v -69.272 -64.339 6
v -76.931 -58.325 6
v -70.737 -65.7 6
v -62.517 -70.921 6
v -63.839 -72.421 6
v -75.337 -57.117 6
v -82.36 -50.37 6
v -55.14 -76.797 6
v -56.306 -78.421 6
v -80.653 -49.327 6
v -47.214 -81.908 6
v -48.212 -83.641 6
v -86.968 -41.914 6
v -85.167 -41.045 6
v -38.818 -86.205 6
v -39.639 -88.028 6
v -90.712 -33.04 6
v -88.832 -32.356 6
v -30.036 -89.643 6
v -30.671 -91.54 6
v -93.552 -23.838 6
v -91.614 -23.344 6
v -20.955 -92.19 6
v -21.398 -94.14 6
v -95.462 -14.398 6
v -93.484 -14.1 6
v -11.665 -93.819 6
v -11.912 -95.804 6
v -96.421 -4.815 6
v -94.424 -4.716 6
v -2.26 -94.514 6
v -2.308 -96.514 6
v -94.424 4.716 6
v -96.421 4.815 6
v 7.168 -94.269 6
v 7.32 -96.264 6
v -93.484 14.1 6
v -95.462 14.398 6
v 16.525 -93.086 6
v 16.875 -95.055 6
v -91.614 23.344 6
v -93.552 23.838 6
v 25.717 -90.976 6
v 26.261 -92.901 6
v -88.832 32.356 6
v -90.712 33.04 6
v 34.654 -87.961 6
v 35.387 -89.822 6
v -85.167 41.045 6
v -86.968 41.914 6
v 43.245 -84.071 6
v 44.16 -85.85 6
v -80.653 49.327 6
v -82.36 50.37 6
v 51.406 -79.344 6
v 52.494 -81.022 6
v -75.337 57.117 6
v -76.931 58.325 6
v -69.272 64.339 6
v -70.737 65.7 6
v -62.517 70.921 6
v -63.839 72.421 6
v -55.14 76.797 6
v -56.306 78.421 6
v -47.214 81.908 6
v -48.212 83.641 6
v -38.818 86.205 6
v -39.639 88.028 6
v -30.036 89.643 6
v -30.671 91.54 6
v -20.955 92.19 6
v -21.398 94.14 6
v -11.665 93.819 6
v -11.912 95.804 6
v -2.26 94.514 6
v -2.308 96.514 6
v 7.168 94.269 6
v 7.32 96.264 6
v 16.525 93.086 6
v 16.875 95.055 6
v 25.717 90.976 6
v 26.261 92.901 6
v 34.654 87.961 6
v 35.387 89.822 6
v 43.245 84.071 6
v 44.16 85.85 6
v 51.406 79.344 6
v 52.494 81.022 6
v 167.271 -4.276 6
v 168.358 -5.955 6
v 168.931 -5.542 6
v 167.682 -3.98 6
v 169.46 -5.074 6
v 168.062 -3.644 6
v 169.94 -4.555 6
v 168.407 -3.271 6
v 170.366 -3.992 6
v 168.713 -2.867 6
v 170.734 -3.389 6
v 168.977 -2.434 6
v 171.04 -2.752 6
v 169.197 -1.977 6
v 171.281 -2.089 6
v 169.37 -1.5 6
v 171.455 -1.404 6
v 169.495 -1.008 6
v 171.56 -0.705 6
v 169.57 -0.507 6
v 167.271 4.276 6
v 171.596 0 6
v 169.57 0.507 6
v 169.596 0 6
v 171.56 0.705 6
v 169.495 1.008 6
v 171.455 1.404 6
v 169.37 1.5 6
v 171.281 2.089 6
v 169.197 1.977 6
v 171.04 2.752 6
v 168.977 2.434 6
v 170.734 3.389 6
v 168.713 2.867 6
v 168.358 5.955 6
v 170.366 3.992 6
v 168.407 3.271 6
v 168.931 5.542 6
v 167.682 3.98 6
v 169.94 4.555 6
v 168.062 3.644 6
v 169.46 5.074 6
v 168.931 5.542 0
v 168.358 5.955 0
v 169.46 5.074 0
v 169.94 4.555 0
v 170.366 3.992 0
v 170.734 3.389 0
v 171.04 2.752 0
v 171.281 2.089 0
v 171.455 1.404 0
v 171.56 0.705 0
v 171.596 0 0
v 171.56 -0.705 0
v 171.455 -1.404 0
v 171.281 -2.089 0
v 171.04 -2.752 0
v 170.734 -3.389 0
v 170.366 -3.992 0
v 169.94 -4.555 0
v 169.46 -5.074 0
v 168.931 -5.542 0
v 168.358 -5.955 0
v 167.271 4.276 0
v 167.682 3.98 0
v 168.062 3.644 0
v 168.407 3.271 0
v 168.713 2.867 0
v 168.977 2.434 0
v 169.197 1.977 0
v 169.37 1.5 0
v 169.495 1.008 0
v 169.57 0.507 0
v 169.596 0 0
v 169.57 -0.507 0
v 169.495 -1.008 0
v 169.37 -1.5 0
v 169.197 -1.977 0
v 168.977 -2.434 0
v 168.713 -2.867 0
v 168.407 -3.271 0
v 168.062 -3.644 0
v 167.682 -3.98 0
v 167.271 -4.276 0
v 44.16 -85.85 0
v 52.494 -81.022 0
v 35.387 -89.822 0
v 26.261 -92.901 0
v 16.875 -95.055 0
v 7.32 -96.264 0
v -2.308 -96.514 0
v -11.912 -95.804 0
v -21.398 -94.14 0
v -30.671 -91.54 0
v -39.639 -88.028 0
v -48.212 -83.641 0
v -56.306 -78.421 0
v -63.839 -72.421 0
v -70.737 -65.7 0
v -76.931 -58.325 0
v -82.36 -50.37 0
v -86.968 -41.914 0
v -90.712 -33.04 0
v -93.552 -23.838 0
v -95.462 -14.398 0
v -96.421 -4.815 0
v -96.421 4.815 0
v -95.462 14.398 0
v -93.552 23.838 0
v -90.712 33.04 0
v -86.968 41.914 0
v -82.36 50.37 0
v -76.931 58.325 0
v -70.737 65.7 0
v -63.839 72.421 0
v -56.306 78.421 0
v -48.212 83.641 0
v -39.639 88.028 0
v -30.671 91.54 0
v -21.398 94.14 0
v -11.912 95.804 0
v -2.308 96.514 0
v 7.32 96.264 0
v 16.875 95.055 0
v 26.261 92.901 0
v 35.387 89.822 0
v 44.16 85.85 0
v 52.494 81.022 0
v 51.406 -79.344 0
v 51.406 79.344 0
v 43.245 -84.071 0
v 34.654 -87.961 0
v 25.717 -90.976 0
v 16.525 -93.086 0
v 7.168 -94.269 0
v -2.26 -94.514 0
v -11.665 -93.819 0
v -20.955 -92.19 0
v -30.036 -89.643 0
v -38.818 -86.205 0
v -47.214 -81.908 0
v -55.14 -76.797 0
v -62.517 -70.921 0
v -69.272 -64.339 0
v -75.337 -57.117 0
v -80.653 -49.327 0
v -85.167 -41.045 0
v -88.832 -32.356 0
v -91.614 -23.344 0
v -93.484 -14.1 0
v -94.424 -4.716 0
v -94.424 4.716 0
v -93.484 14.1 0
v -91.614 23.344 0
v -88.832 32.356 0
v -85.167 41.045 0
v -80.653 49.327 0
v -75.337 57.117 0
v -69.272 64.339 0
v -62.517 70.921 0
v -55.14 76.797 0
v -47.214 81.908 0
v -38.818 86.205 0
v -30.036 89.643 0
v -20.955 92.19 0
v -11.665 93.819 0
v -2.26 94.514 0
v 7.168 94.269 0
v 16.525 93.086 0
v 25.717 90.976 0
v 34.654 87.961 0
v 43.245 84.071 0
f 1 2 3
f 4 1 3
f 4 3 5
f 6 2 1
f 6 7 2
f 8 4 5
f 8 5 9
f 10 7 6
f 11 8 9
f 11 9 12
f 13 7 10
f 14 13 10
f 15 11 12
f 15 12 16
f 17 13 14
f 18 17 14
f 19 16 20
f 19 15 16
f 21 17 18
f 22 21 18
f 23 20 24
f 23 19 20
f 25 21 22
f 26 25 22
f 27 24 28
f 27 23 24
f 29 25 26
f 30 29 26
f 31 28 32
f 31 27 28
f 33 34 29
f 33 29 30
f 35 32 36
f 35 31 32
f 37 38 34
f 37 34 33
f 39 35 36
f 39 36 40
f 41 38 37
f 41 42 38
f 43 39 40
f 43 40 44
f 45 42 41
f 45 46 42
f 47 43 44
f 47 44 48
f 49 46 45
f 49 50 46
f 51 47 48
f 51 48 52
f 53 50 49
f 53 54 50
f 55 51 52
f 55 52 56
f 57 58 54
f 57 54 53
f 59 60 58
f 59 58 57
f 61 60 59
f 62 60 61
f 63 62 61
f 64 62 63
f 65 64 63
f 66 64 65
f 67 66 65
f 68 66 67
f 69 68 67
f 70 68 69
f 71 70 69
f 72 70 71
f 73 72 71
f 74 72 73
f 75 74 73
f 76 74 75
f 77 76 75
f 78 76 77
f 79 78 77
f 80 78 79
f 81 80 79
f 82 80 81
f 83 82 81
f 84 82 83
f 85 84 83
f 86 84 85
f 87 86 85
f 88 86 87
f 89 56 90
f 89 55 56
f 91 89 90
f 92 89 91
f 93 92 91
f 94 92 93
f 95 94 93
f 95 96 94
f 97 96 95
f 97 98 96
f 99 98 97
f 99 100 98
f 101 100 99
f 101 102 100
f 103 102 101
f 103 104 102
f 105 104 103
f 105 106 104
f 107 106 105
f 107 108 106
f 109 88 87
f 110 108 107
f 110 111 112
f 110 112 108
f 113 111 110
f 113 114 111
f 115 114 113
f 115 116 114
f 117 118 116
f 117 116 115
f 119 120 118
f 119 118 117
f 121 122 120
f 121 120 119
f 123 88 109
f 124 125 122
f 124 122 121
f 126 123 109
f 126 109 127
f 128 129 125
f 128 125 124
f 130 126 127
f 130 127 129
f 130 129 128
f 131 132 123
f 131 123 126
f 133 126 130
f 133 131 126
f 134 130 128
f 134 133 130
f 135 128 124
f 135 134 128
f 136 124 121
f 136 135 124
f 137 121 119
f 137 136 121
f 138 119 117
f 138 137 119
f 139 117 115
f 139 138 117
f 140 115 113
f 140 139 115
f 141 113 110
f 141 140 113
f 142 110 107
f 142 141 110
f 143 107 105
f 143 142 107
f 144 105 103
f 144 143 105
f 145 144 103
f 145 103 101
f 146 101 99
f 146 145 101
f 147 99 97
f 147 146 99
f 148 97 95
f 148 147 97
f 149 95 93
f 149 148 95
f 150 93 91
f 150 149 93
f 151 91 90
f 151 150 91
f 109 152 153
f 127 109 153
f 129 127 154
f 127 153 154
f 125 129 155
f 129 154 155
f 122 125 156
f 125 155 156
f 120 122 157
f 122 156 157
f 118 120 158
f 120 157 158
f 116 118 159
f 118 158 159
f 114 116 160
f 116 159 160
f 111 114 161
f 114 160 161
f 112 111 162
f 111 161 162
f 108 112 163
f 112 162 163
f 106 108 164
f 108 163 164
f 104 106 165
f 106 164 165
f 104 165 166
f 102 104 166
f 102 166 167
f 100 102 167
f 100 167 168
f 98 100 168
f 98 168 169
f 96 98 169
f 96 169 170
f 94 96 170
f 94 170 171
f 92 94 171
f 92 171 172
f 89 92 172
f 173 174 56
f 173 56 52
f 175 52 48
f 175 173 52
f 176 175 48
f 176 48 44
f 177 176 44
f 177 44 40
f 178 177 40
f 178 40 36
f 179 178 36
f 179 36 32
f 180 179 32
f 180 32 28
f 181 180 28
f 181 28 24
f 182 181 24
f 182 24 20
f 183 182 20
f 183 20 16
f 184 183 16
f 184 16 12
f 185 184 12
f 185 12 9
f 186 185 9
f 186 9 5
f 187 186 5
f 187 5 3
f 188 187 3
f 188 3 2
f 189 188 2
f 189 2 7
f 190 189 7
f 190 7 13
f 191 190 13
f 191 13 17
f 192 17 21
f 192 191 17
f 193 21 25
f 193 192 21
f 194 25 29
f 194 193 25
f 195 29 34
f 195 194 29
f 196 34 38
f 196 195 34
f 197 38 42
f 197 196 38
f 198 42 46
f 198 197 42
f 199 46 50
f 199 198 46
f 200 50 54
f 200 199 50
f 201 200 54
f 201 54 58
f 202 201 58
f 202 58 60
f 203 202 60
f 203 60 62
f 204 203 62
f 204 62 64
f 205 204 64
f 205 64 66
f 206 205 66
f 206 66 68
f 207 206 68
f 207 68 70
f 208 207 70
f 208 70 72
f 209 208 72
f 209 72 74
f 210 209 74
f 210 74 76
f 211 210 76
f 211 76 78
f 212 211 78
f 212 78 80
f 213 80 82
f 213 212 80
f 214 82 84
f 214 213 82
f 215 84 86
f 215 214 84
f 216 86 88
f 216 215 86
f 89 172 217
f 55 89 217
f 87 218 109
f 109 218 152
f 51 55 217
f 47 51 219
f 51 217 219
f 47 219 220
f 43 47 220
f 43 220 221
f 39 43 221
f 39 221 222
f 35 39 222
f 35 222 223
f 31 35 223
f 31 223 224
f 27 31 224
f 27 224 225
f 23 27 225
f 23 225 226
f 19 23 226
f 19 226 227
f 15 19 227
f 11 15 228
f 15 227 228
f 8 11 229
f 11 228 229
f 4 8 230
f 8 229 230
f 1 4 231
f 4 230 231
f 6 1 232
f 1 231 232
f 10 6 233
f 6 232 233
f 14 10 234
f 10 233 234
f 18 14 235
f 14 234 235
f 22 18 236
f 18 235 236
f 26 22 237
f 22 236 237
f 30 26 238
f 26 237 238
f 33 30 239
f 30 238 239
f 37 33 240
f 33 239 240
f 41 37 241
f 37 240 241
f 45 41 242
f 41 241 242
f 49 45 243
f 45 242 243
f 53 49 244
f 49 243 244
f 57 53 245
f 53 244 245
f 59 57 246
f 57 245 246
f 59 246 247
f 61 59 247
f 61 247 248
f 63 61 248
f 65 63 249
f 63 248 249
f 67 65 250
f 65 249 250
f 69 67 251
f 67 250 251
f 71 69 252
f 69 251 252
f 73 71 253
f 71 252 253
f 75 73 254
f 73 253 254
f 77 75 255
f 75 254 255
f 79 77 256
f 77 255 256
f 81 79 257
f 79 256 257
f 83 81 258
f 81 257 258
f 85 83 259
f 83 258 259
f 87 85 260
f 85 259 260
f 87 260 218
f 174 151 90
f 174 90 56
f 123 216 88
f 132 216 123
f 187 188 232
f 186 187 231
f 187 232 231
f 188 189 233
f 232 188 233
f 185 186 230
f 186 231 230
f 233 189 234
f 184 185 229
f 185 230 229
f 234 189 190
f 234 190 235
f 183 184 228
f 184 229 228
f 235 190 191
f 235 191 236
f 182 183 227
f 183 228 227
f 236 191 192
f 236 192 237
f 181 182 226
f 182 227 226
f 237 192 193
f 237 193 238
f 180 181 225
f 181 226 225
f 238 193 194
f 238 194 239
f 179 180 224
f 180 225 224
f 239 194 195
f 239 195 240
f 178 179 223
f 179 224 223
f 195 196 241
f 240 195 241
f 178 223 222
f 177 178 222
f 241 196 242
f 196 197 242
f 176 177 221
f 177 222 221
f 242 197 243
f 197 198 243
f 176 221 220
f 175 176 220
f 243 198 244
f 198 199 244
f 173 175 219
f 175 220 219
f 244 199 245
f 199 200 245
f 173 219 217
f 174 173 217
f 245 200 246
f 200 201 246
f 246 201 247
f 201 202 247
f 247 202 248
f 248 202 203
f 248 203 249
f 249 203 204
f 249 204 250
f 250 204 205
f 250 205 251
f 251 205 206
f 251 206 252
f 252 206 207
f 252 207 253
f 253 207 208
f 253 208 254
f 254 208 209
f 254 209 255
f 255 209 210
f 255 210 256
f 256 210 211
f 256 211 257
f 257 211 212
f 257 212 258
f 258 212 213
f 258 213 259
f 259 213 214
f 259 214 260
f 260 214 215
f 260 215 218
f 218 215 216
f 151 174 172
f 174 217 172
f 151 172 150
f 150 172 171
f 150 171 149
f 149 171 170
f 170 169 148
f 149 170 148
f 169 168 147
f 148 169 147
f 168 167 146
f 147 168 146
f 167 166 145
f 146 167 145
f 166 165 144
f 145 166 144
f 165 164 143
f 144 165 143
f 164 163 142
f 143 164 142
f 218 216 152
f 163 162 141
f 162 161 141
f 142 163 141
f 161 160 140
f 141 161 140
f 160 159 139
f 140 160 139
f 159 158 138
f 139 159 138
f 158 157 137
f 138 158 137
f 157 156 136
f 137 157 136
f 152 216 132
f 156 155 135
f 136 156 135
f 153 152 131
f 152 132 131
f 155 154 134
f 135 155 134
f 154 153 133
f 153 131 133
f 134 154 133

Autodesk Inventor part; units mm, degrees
ref_plane "YZ Plane" through (0, 0, 0) normal (1, 0, 0) x (0, 1, 0)
ref_plane "XZ Plane" through (0, 0, 0) normal (0, 1, 0) x (-1, 0, 0)
ref_plane "XY Plane" through (0, 0, 0) normal (0, 0, 1) x (1, 0, 0)
sketch "Sketch1" plane through (0, 0, 0) normal (0, 0, 1) x (1, 0, 0)
  arc A0 (51.4063, 79.344) -> (51.4063, -79.344) centre (0, 0) ccw
  arc A1 (167.2707, -4.2764) -> (167.2707, 4.2764) centre (164.5, 0) ccw
  line L0 (51.4063, 79.344) -> (167.2707, 4.2764)
  line L1 (167.2707, -4.2764) -> (51.4063, -79.344)
  line L2 (-150.1688, 0) -> (225.2229, 0) projected
  arc A2 (52.4938, 81.0225) -> (52.4938, -81.0225) centre (0, 0) ccw
  arc A3 (168.3582, -5.9549) -> (168.3582, 5.9549) centre (164.5, 0) ccw
  line L3 (52.4938, 81.0225) -> (168.3582, 5.9549)
  line L4 (168.3582, -5.9549) -> (52.4938, -81.0225)
  dimension "d0" = 2
  dimension "d2" = 5.0955
  dimension "d5" = 94.5414
  dimension "d6" = 164.5
extrude "Extrusion1" add sketch "Sketch1" along normal blind 6 contours A0 L2 A2 L3 A3 A1 L0 | A0 L1 A1 L2 A3 L4 A2
properties part number "belt"
